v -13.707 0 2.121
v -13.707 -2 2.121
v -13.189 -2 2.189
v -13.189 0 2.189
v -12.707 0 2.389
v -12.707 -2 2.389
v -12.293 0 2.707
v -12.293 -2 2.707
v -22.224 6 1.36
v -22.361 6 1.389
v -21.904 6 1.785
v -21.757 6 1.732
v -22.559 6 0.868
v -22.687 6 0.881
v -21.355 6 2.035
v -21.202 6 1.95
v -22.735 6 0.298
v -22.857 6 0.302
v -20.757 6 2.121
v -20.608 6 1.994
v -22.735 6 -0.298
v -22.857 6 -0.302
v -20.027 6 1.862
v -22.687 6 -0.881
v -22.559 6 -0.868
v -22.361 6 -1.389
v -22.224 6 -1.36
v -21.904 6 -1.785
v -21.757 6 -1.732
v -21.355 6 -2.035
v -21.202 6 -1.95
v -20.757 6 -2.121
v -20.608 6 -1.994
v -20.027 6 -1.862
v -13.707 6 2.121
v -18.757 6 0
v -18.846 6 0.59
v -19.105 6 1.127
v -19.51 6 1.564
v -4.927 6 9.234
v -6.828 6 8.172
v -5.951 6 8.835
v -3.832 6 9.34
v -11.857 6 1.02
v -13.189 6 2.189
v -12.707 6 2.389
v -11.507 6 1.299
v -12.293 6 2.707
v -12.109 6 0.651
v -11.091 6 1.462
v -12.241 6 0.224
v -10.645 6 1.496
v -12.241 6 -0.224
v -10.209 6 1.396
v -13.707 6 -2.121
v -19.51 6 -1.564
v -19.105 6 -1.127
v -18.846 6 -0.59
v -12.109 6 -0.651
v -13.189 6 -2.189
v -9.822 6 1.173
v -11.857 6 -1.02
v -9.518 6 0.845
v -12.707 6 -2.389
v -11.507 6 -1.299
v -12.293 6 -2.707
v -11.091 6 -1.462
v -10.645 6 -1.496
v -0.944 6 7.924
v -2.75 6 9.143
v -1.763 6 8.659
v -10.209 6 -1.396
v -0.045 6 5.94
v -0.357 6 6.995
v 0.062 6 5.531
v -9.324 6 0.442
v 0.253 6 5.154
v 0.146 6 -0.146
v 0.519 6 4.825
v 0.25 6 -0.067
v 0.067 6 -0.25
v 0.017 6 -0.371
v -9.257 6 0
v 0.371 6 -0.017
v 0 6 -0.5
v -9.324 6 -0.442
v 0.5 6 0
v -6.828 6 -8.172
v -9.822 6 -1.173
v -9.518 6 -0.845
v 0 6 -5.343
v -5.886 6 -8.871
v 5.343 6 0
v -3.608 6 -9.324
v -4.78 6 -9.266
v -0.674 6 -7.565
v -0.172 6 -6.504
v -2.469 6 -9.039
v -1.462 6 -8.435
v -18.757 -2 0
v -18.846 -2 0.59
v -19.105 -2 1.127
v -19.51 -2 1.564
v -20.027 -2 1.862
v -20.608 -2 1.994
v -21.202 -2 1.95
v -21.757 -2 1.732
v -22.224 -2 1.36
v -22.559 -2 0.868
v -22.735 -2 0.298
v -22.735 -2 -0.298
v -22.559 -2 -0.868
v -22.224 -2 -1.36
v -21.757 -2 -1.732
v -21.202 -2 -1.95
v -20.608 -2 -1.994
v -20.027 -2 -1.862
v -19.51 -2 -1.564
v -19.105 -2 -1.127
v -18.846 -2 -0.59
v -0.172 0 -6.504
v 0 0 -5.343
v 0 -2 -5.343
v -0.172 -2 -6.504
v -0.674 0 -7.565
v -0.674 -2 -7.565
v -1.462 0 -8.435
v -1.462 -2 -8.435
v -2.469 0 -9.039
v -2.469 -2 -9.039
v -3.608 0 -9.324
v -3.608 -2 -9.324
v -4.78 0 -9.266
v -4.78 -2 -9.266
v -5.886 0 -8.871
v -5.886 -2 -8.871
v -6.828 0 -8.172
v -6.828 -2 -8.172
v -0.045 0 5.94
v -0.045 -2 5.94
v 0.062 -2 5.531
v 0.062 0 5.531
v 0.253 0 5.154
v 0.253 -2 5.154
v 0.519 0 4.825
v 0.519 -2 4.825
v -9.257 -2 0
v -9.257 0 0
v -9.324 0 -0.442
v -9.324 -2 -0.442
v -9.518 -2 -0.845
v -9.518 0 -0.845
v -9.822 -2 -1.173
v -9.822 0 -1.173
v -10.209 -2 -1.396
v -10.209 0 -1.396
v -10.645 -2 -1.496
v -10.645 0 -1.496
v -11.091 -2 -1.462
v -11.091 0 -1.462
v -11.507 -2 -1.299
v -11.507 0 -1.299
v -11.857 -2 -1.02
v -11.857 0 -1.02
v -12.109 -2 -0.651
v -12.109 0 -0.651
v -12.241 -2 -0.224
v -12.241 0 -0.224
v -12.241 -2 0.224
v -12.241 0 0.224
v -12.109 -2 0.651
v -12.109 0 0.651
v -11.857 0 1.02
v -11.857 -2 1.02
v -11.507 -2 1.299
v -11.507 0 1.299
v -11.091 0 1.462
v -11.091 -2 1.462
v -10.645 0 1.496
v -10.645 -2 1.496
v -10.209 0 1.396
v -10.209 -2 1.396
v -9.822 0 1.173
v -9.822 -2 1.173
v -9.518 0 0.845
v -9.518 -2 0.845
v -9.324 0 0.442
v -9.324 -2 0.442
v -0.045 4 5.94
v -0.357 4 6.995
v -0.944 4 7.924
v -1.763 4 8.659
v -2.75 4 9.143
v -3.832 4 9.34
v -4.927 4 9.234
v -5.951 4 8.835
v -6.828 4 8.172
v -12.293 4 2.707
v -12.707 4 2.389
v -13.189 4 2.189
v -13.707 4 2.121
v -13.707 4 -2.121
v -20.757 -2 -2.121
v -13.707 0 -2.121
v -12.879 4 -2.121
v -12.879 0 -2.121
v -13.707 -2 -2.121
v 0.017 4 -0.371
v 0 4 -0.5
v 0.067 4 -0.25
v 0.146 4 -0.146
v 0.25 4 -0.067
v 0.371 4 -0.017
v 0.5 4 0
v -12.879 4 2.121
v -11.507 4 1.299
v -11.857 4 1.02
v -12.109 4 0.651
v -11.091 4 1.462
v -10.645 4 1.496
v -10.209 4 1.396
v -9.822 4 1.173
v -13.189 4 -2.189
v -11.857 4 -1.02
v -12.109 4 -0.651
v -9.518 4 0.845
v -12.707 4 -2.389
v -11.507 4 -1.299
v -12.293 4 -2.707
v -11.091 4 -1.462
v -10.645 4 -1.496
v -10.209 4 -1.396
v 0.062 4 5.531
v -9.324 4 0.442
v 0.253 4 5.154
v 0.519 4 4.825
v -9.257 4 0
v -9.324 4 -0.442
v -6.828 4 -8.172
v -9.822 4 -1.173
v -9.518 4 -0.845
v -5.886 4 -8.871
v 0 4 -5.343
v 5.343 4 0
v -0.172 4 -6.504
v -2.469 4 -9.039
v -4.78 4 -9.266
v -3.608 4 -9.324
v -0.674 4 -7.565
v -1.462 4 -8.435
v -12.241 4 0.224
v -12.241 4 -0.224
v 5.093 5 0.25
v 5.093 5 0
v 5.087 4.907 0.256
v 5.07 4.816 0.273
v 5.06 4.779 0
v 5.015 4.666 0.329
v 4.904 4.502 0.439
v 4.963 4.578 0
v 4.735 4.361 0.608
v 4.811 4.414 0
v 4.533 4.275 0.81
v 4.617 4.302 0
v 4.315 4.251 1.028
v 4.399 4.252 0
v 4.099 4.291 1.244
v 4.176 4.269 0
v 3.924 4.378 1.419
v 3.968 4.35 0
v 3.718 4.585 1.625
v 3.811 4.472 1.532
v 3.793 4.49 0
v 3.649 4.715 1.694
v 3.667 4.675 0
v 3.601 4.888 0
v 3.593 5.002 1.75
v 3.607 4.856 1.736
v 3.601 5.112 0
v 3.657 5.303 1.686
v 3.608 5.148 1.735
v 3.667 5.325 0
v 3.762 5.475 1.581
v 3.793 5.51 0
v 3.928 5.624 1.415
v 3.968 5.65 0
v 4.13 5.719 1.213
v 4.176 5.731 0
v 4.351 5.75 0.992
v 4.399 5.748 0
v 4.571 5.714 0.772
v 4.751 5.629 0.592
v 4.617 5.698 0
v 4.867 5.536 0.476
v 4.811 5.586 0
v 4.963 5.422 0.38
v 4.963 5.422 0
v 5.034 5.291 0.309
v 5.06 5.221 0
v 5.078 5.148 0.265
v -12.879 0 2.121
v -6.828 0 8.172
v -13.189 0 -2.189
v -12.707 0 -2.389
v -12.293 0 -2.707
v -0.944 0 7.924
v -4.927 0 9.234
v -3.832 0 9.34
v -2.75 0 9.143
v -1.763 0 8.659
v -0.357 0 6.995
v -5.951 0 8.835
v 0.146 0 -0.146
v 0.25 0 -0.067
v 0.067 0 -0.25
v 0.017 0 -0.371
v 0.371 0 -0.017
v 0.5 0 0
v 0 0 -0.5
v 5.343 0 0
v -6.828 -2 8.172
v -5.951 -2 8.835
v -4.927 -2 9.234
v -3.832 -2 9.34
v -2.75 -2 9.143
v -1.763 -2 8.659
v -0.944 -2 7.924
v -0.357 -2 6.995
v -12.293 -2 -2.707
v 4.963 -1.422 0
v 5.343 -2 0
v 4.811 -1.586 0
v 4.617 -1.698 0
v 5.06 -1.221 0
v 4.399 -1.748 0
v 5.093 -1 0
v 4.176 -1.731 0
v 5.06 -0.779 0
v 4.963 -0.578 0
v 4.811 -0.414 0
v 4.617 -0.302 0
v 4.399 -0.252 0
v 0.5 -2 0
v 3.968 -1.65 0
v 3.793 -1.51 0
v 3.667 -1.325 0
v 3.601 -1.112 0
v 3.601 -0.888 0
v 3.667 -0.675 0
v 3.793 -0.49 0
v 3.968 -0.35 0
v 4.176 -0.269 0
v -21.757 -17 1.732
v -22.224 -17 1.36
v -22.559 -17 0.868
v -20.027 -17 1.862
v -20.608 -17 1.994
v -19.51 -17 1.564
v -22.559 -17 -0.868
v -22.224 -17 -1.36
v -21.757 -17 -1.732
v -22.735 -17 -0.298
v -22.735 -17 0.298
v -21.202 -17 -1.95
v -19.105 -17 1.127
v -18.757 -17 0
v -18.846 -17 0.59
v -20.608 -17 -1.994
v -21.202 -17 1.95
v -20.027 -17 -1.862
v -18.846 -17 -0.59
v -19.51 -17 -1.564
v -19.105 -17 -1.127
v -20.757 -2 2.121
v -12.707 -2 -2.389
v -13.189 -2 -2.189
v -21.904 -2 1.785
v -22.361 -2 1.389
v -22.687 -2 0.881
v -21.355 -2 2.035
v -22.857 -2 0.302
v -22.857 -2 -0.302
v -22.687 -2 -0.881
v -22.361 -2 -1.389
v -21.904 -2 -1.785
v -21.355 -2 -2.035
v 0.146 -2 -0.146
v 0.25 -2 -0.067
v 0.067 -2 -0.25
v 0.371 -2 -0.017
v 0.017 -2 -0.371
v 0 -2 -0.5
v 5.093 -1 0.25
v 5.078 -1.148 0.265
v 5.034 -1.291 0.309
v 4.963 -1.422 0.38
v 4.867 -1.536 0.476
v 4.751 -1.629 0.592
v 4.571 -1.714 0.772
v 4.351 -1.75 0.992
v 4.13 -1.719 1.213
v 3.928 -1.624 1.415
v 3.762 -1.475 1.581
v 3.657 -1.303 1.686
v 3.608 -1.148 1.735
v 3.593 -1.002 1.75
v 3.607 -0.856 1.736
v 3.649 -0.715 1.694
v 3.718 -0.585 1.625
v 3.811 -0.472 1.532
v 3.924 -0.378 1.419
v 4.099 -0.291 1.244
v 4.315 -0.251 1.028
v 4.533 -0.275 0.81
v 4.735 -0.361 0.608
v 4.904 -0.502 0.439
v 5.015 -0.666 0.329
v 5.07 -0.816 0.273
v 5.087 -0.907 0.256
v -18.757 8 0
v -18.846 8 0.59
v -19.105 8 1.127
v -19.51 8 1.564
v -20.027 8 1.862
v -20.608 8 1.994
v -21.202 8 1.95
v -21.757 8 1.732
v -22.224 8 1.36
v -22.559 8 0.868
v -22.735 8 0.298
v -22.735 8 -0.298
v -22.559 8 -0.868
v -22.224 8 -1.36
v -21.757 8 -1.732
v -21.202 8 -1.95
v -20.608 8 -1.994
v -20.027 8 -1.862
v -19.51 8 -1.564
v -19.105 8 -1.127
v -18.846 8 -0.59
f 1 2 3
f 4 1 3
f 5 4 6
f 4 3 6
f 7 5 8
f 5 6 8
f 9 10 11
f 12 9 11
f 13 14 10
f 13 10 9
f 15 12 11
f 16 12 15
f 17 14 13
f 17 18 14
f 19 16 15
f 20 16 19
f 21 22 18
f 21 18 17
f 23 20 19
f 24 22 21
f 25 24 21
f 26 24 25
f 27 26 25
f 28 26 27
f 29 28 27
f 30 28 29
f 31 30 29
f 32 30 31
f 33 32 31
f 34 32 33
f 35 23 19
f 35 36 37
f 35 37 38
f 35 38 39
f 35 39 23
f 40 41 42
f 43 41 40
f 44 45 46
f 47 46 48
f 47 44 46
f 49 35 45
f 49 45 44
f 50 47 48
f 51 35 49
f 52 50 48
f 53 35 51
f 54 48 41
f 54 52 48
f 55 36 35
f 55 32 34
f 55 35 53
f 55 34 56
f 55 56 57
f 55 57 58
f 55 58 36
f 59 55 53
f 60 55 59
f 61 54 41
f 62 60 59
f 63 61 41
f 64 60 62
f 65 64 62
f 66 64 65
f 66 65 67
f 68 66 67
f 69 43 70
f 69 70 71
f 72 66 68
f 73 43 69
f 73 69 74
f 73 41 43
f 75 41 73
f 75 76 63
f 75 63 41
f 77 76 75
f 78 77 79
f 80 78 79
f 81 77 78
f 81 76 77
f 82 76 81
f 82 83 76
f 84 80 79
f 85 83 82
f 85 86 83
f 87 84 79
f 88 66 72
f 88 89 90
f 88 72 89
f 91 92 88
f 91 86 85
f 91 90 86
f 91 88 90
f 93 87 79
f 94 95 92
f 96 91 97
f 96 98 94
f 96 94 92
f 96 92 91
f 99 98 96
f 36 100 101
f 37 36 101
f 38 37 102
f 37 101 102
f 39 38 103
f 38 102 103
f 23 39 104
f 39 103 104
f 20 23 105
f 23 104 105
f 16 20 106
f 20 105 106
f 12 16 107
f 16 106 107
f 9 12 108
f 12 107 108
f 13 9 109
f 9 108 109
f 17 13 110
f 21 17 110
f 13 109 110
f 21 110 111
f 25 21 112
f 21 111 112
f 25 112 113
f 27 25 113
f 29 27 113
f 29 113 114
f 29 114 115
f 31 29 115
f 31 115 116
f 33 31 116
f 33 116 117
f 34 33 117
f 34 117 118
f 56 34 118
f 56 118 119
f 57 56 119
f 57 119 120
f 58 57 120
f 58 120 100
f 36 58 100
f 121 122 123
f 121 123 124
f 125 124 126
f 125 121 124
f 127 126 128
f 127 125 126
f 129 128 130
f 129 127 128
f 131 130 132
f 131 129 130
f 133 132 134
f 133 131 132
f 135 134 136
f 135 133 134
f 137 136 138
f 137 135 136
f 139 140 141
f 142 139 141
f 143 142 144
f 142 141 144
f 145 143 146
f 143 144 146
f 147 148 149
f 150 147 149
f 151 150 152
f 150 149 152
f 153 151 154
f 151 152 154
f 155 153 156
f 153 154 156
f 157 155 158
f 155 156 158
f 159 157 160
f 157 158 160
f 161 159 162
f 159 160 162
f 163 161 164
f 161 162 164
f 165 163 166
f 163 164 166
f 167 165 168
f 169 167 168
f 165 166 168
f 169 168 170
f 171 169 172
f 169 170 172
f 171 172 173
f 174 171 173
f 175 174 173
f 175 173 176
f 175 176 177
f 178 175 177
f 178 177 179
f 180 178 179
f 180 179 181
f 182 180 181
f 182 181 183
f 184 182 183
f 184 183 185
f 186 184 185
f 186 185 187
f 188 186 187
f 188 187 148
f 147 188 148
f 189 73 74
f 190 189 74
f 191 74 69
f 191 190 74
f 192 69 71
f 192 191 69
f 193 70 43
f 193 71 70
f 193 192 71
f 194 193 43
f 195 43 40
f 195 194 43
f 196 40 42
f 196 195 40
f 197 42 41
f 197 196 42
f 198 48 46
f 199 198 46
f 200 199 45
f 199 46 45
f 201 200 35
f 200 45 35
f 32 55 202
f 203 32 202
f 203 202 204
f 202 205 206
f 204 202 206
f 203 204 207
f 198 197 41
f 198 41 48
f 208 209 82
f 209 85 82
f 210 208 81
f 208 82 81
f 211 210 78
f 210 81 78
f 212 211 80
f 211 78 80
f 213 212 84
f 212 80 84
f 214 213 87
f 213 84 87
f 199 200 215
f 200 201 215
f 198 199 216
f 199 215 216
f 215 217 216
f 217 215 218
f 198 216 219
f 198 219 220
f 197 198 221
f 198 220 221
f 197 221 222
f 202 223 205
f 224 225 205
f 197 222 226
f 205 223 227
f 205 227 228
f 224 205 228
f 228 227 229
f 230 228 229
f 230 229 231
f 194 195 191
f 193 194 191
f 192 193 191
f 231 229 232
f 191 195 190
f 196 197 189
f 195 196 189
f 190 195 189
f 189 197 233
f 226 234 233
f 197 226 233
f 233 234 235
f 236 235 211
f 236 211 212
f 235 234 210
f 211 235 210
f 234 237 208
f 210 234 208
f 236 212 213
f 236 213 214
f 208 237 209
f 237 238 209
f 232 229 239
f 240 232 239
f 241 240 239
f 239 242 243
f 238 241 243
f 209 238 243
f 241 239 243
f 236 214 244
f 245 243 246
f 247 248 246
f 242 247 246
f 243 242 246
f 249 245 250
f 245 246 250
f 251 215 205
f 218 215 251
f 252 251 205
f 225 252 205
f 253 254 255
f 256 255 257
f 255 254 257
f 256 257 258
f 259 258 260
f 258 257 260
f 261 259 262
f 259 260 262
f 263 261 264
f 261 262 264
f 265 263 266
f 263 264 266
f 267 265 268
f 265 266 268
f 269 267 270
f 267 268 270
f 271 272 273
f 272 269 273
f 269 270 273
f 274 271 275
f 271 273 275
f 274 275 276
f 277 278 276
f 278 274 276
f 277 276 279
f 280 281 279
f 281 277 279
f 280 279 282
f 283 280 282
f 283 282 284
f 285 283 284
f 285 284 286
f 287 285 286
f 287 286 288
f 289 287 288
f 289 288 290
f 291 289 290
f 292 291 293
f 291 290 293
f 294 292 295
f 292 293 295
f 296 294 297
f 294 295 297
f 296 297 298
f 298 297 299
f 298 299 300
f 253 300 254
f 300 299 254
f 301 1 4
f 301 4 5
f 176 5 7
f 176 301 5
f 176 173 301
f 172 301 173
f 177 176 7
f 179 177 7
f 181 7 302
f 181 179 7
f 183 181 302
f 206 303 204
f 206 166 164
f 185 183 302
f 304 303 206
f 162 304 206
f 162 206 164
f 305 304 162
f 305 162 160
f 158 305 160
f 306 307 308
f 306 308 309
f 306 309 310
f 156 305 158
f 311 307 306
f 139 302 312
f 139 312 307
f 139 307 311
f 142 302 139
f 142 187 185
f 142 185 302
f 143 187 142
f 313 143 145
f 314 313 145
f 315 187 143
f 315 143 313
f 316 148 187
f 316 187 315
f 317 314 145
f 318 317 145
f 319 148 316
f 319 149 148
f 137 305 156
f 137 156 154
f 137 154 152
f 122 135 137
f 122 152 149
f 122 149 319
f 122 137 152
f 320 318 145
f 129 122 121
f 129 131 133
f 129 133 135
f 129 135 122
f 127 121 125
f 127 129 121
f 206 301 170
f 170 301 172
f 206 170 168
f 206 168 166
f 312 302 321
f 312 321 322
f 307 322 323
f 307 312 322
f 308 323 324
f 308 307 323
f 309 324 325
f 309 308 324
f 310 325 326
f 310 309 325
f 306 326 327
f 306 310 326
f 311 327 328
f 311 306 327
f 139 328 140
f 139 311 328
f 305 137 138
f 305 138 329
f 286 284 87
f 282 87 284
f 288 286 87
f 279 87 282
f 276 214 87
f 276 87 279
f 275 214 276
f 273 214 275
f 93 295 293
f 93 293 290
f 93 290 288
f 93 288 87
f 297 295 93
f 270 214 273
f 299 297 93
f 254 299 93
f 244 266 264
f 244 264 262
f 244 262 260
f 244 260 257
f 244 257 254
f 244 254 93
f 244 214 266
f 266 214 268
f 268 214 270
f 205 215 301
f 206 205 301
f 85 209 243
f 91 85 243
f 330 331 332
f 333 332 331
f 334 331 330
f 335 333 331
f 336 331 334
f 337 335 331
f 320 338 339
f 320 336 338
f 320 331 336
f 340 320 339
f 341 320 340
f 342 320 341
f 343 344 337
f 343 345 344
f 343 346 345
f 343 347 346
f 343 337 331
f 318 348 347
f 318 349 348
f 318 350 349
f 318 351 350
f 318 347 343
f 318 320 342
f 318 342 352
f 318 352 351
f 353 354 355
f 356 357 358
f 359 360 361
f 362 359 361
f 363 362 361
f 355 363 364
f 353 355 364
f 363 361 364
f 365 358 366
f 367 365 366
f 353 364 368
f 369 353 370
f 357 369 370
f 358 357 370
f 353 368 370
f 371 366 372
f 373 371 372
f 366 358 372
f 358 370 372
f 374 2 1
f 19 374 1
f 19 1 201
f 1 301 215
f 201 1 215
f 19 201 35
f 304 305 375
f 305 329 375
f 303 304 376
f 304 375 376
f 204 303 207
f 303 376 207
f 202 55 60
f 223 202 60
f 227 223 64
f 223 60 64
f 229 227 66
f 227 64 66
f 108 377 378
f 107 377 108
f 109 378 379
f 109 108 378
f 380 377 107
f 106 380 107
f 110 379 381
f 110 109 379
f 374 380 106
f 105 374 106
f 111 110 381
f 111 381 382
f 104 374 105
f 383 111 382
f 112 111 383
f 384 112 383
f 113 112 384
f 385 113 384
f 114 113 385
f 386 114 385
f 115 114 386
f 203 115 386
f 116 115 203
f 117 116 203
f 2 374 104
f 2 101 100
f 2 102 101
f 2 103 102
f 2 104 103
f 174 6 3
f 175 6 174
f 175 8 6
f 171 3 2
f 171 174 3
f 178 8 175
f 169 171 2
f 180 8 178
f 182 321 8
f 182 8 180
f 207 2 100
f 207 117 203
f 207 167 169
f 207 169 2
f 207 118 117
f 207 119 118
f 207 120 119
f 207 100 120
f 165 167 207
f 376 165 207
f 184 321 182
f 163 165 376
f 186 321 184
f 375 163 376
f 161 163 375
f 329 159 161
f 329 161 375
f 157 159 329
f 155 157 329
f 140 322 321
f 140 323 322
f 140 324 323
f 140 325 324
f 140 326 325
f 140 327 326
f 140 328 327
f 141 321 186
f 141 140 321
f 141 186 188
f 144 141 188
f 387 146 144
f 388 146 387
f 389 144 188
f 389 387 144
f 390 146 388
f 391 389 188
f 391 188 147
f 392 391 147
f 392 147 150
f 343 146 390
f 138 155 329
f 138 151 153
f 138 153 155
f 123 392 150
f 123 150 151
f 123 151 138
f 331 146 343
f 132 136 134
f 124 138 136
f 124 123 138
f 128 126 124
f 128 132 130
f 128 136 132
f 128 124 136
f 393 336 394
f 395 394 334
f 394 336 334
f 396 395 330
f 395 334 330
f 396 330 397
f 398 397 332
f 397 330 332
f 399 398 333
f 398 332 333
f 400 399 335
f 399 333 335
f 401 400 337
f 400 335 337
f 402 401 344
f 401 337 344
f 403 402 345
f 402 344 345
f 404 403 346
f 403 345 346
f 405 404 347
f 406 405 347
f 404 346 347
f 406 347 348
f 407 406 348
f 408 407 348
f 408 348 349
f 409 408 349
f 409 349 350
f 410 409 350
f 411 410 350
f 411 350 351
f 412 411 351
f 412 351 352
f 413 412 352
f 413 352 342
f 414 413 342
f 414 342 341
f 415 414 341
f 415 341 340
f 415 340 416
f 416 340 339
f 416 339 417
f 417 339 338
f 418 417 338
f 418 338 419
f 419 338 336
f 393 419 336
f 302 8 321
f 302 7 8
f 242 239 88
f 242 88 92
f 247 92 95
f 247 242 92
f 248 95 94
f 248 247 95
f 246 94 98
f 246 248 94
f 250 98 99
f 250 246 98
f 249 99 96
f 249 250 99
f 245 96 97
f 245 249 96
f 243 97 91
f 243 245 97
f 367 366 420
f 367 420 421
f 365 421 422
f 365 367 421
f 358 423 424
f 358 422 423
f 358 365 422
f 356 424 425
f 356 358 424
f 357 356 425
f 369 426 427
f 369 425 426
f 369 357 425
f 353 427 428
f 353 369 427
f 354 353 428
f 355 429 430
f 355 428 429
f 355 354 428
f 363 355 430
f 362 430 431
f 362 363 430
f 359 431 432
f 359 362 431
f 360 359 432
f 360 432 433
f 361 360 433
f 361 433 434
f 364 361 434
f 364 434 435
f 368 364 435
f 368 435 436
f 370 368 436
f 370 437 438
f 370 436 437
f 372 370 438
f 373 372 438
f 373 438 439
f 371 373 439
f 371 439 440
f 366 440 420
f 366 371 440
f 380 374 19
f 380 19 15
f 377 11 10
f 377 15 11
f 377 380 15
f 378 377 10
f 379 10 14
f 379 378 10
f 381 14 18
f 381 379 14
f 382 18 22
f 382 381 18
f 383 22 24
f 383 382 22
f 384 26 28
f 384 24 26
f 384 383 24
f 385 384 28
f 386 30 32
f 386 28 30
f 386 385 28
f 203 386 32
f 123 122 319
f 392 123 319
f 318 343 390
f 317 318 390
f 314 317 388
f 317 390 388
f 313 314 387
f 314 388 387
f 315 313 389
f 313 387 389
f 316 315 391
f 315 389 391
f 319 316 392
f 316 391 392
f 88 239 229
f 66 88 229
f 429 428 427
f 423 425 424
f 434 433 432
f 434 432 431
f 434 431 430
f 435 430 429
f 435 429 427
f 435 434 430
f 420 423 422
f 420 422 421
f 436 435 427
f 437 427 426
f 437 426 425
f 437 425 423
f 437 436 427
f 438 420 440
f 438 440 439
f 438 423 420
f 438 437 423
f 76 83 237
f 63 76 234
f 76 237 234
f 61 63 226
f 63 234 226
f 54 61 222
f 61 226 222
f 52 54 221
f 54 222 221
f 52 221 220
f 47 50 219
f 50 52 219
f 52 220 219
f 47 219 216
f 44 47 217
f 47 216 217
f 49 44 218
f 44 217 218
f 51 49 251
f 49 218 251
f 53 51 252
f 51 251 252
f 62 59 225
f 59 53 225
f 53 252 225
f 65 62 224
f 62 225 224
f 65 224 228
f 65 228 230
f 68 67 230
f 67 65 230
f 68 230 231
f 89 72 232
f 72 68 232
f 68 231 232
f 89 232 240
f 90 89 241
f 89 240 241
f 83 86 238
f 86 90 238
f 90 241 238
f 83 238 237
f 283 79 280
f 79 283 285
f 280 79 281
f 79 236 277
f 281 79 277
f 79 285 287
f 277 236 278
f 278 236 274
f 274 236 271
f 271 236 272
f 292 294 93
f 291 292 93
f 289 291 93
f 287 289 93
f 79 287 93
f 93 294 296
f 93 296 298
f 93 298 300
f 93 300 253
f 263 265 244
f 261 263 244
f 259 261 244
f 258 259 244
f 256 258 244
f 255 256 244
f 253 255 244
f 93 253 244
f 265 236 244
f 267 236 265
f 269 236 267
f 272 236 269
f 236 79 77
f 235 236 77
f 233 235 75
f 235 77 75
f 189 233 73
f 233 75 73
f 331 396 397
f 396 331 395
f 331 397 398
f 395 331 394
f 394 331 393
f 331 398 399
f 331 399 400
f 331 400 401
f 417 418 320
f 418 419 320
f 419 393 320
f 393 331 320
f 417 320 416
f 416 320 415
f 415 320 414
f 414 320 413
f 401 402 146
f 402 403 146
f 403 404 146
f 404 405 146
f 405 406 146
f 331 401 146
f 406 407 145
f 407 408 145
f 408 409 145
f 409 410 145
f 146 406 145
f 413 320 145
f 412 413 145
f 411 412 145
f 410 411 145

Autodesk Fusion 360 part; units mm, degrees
sketch "Sketch2" plane through (0, 0, 0) normal (0, 1, 0) x (1, 0, 0)
  line L0 (0, 0) -> (0, -5.3431)
  line L1 (0, 0) -> (-15, 0)
  line L2 (0, 0) -> (0, 5.3431)
  line L3 (-6.8284, 8.1716) -> (-12.8787, 2.1213)
  line L4 (-12.8787, -2.1213) -> (-6.8284, -8.1716)
  arc A0 (-6.8284, -8.1716) -> (0, -5.3431) centre (-4, -5.3431) ccw
  arc A1 (0, 5.3431) -> (-6.8284, 8.1716) centre (-4, 5.3431) ccw
  circle A2 centre (-10.7574, 0) radius 1.5
  line L5 (-12.8787, -2.1213) -> (-12.8787, 2.1213)
  point P0 (0, -15)
  point P1 (0, 15)
  dimension "d2" = 15
  dimension "d3" = 15
  dimension "d4" = 15
  dimension "d5" = 4
  dimension "d6" = 4
  dimension "d23" = 3
ref_plane "WorkPlane1" through (0, 0, 0) normal (0, 1, 0) x (0, 0, 1)
ref_plane "WorkPlane2" through (0, 4, 0) normal (0, 1, 0) x (0, 0, 1)
sketch "Sketch4" plane through (0, 4, 0) normal (0, 1, 0) x (1, 0, 0)
  line L0 (0, 0) -> (0, -5.3431)
  line L1 (0, 0) -> (0, 5.3431)
  line L2 (0, 0) -> (-15, 0)
  line L3 (-6.8284, -8.1716) -> (-12.8787, -2.1213)
  line L4 (-6.8284, 8.1716) -> (-12.8787, 2.1213)
  arc A0 (-6.8284, -8.1716) -> (0, -5.3431) centre (-4, -5.3431) ccw
  arc A1 (0, 5.3431) -> (-6.8284, 8.1716) centre (-4, 5.3431) ccw
  circle A2 centre (-10.7574, 0) radius 1.5
  line L5 (-12.8787, -2.1213) -> (-12.8787, 2.1213)
  point P0 (0, -15)
  point P1 (0, 15)
  dimension "d12" = 15
  dimension "d13" = 15
  dimension "d14" = 15
  dimension "d15" = 4
  dimension "d16" = 4
  dimension "d20" = 3
extrude "Extrude3" add sketch "Sketch4" along normal blind 2 contours L2 A2 | L2 A2 makes body 1
extrude "Extrude4" add sketch "Sketch2" against normal blind 2 separate body contours L0 L1 L4 A0 A2 L5 | L1 L2 L3 A1 A2 L5 makes body 2
sketch "Sketch7" plane through (0, 0, 0) normal (1, 0, 0) x (0, 1, 0)
  line L0 (0, 0) -> (0, 1)
  line L1 (0, 1) -> (-2, 1)
  dimension "d30" = 1
sketch "Sketch10" plane through (0, 0, 0) normal (0, 1, 0) x (1, 0, 0)
  line L0 (5.3431, 0) -> (0, -5.3431)
  line L1 (5.3431, 0) -> (11.5711, 0) construction
  line L2 (5.3431, 0) -> (0, 0)
  line L3 (0, 0) -> (0, -5.3431)
  point P0 (0, -5.3431)
  dimension "d34" = 135
extrude "Extrude6" add sketch "Sketch10" against normal blind 2 bodies 2
fillet "Fillet1" radius 2 1 edges at (0, -1, 5.3431) on bodies 2
sketch "Sketch11" plane through (0, 0, 0) normal (0, 0, -1) x (1, 0, 0)
  line L0 (0, 0) -> (5.3431, 0)
  line L1 (5.3431, 0) -> (5.3431, 2)
  line L2 (5.3431, 2) -> (0, 2)
  line L3 (0, 2) -> (0, 0)
  circle A0 centre (4.3431, 1) radius 0.75
  dimension "d41" = 1.5
  dimension "d42" = 1
  dimension "d43" = 1
extrude "Extrude7" cut sketch "Sketch11" against normal blind 2.5 contours A0 bodies 2
fillet "Fillet2" radius 0.5 1 edges at (0, -1, 0) on bodies 2
ref_plane "WorkPlane3" through (0, 2, 0) normal (0, 1, 0) x (0, 0, 1)
mirror "Mirror1" about plane through (0, 2, 0) normal (0, 1, 0) of bodies 2 makes body 3
extrude "Extrude9" cut sketch "Sketch4" along normal blind 2 contours L2 A2 | L2 A2 bodies 1
sketch "Sketch13" plane through (-12.8787, 0, 0) normal (-1, 0, 0) x (0, -1, 0)
  line L0 (-4, -2.1213) -> (-4, 2.1213)
  line L1 (-4, 2.1213) -> (-6, 2.1213)
  line L2 (-6, 2.1213) -> (-6, -2.1213)
  line L3 (-6, -2.1213) -> (-4, -2.1213)
  line L4 (-6, 2.1213) -> (2, 2.1213)
  line L5 (2, 2.1213) -> (2, -2.1213)
  line L6 (2, -2.1213) -> (-6, -2.1213)
  line L7 (-6, 2.1213) -> (-6, -2.1213)
  point P0 (2, 2.1213)
extrude "Extrude10" add sketch "Sketch13" along normal blind 10 bodies 1 2 3
fillet "Fillet3" radius 2 4 edges at (-12.8787, -1, -2.1213) (-12.8787, 5, -2.1213) (-12.8787, -1, 2.1213) (-12.8787, 5, 2.1213) on bodies 1
sketch "Sketch16" plane through (0, -2, 0) normal (0, -1, 0) x (1, 0, 0)
  circle A0 centre (-10.7574, 0) radius 1.5
  arc A1 (-0.0448, 5.9402) -> (-6.8284, 8.1716) centre (-4, 5.3431) ccw
  line L0 (-6.8284, 8.1716) -> (-12.2929, 2.7071)
  arc A2 (-13.7071, 2.1213) -> (-12.2929, 2.7071) centre (-13.7071, 4.1213) ccw
  line L1 (-13.7071, 2.1213) -> (-22.8787, 2.1213)
  line L2 (-22.8787, 2.1213) -> (-22.8787, -2.1213)
  line L3 (-22.8787, -2.1213) -> (-13.7071, -2.1213)
  arc A3 (-12.2929, -2.7071) -> (-13.7071, -2.1213) centre (-13.7071, -4.1213) ccw
  line L4 (-12.2929, -2.7071) -> (-6.8284, -8.1716)
  arc A4 (-6.8284, -8.1716) -> (0, -5.3431) centre (-4, -5.3431) ccw
  line L5 (0, -5.3431) -> (0, -0.5)
  arc A5 (0.5, 0) -> (0, -0.5) centre (0.5, -0.5) ccw
  line L6 (0.5, 0) -> (5.3431, 0)
  line L7 (5.3431, 0) -> (0.5186, 4.8246)
  arc A6 (-0.0448, 5.9402) -> (0.5186, 4.8246) centre (1.9328, 6.2388) ccw
  circle A7 centre (-20.7574, 0) radius 2.1213
  circle A8 centre (-20.7574, 0) radius 2
  dimension "d64" = 4
extrude "Extrude11" cut sketch "Sketch16" against normal blind 9 contours L1 L2 A7 | L2 L3 A7 bodies 1
extrude "Extrude12" cut sketch "Sketch16" against normal blind 9 contours A8 bodies 1
sketch "Sketch17" plane through (0, 0, 0) normal (0, 1, 0) x (1, 0, 0)
  circle A0 centre (15, 0) radius 2
  dimension "d67" = 4
extrude "Extrude13" add sketch "Sketch17" along normal blind 25 separate body makes body 4
copy_body "Body->Comp4" bodies 4 removing the originals makes body 5 in component "Component"
component "Component" placed x (1, 0, 0) y (0, 1, 0) z (0, 0, 1) at (-35.7574, -17, 0)
